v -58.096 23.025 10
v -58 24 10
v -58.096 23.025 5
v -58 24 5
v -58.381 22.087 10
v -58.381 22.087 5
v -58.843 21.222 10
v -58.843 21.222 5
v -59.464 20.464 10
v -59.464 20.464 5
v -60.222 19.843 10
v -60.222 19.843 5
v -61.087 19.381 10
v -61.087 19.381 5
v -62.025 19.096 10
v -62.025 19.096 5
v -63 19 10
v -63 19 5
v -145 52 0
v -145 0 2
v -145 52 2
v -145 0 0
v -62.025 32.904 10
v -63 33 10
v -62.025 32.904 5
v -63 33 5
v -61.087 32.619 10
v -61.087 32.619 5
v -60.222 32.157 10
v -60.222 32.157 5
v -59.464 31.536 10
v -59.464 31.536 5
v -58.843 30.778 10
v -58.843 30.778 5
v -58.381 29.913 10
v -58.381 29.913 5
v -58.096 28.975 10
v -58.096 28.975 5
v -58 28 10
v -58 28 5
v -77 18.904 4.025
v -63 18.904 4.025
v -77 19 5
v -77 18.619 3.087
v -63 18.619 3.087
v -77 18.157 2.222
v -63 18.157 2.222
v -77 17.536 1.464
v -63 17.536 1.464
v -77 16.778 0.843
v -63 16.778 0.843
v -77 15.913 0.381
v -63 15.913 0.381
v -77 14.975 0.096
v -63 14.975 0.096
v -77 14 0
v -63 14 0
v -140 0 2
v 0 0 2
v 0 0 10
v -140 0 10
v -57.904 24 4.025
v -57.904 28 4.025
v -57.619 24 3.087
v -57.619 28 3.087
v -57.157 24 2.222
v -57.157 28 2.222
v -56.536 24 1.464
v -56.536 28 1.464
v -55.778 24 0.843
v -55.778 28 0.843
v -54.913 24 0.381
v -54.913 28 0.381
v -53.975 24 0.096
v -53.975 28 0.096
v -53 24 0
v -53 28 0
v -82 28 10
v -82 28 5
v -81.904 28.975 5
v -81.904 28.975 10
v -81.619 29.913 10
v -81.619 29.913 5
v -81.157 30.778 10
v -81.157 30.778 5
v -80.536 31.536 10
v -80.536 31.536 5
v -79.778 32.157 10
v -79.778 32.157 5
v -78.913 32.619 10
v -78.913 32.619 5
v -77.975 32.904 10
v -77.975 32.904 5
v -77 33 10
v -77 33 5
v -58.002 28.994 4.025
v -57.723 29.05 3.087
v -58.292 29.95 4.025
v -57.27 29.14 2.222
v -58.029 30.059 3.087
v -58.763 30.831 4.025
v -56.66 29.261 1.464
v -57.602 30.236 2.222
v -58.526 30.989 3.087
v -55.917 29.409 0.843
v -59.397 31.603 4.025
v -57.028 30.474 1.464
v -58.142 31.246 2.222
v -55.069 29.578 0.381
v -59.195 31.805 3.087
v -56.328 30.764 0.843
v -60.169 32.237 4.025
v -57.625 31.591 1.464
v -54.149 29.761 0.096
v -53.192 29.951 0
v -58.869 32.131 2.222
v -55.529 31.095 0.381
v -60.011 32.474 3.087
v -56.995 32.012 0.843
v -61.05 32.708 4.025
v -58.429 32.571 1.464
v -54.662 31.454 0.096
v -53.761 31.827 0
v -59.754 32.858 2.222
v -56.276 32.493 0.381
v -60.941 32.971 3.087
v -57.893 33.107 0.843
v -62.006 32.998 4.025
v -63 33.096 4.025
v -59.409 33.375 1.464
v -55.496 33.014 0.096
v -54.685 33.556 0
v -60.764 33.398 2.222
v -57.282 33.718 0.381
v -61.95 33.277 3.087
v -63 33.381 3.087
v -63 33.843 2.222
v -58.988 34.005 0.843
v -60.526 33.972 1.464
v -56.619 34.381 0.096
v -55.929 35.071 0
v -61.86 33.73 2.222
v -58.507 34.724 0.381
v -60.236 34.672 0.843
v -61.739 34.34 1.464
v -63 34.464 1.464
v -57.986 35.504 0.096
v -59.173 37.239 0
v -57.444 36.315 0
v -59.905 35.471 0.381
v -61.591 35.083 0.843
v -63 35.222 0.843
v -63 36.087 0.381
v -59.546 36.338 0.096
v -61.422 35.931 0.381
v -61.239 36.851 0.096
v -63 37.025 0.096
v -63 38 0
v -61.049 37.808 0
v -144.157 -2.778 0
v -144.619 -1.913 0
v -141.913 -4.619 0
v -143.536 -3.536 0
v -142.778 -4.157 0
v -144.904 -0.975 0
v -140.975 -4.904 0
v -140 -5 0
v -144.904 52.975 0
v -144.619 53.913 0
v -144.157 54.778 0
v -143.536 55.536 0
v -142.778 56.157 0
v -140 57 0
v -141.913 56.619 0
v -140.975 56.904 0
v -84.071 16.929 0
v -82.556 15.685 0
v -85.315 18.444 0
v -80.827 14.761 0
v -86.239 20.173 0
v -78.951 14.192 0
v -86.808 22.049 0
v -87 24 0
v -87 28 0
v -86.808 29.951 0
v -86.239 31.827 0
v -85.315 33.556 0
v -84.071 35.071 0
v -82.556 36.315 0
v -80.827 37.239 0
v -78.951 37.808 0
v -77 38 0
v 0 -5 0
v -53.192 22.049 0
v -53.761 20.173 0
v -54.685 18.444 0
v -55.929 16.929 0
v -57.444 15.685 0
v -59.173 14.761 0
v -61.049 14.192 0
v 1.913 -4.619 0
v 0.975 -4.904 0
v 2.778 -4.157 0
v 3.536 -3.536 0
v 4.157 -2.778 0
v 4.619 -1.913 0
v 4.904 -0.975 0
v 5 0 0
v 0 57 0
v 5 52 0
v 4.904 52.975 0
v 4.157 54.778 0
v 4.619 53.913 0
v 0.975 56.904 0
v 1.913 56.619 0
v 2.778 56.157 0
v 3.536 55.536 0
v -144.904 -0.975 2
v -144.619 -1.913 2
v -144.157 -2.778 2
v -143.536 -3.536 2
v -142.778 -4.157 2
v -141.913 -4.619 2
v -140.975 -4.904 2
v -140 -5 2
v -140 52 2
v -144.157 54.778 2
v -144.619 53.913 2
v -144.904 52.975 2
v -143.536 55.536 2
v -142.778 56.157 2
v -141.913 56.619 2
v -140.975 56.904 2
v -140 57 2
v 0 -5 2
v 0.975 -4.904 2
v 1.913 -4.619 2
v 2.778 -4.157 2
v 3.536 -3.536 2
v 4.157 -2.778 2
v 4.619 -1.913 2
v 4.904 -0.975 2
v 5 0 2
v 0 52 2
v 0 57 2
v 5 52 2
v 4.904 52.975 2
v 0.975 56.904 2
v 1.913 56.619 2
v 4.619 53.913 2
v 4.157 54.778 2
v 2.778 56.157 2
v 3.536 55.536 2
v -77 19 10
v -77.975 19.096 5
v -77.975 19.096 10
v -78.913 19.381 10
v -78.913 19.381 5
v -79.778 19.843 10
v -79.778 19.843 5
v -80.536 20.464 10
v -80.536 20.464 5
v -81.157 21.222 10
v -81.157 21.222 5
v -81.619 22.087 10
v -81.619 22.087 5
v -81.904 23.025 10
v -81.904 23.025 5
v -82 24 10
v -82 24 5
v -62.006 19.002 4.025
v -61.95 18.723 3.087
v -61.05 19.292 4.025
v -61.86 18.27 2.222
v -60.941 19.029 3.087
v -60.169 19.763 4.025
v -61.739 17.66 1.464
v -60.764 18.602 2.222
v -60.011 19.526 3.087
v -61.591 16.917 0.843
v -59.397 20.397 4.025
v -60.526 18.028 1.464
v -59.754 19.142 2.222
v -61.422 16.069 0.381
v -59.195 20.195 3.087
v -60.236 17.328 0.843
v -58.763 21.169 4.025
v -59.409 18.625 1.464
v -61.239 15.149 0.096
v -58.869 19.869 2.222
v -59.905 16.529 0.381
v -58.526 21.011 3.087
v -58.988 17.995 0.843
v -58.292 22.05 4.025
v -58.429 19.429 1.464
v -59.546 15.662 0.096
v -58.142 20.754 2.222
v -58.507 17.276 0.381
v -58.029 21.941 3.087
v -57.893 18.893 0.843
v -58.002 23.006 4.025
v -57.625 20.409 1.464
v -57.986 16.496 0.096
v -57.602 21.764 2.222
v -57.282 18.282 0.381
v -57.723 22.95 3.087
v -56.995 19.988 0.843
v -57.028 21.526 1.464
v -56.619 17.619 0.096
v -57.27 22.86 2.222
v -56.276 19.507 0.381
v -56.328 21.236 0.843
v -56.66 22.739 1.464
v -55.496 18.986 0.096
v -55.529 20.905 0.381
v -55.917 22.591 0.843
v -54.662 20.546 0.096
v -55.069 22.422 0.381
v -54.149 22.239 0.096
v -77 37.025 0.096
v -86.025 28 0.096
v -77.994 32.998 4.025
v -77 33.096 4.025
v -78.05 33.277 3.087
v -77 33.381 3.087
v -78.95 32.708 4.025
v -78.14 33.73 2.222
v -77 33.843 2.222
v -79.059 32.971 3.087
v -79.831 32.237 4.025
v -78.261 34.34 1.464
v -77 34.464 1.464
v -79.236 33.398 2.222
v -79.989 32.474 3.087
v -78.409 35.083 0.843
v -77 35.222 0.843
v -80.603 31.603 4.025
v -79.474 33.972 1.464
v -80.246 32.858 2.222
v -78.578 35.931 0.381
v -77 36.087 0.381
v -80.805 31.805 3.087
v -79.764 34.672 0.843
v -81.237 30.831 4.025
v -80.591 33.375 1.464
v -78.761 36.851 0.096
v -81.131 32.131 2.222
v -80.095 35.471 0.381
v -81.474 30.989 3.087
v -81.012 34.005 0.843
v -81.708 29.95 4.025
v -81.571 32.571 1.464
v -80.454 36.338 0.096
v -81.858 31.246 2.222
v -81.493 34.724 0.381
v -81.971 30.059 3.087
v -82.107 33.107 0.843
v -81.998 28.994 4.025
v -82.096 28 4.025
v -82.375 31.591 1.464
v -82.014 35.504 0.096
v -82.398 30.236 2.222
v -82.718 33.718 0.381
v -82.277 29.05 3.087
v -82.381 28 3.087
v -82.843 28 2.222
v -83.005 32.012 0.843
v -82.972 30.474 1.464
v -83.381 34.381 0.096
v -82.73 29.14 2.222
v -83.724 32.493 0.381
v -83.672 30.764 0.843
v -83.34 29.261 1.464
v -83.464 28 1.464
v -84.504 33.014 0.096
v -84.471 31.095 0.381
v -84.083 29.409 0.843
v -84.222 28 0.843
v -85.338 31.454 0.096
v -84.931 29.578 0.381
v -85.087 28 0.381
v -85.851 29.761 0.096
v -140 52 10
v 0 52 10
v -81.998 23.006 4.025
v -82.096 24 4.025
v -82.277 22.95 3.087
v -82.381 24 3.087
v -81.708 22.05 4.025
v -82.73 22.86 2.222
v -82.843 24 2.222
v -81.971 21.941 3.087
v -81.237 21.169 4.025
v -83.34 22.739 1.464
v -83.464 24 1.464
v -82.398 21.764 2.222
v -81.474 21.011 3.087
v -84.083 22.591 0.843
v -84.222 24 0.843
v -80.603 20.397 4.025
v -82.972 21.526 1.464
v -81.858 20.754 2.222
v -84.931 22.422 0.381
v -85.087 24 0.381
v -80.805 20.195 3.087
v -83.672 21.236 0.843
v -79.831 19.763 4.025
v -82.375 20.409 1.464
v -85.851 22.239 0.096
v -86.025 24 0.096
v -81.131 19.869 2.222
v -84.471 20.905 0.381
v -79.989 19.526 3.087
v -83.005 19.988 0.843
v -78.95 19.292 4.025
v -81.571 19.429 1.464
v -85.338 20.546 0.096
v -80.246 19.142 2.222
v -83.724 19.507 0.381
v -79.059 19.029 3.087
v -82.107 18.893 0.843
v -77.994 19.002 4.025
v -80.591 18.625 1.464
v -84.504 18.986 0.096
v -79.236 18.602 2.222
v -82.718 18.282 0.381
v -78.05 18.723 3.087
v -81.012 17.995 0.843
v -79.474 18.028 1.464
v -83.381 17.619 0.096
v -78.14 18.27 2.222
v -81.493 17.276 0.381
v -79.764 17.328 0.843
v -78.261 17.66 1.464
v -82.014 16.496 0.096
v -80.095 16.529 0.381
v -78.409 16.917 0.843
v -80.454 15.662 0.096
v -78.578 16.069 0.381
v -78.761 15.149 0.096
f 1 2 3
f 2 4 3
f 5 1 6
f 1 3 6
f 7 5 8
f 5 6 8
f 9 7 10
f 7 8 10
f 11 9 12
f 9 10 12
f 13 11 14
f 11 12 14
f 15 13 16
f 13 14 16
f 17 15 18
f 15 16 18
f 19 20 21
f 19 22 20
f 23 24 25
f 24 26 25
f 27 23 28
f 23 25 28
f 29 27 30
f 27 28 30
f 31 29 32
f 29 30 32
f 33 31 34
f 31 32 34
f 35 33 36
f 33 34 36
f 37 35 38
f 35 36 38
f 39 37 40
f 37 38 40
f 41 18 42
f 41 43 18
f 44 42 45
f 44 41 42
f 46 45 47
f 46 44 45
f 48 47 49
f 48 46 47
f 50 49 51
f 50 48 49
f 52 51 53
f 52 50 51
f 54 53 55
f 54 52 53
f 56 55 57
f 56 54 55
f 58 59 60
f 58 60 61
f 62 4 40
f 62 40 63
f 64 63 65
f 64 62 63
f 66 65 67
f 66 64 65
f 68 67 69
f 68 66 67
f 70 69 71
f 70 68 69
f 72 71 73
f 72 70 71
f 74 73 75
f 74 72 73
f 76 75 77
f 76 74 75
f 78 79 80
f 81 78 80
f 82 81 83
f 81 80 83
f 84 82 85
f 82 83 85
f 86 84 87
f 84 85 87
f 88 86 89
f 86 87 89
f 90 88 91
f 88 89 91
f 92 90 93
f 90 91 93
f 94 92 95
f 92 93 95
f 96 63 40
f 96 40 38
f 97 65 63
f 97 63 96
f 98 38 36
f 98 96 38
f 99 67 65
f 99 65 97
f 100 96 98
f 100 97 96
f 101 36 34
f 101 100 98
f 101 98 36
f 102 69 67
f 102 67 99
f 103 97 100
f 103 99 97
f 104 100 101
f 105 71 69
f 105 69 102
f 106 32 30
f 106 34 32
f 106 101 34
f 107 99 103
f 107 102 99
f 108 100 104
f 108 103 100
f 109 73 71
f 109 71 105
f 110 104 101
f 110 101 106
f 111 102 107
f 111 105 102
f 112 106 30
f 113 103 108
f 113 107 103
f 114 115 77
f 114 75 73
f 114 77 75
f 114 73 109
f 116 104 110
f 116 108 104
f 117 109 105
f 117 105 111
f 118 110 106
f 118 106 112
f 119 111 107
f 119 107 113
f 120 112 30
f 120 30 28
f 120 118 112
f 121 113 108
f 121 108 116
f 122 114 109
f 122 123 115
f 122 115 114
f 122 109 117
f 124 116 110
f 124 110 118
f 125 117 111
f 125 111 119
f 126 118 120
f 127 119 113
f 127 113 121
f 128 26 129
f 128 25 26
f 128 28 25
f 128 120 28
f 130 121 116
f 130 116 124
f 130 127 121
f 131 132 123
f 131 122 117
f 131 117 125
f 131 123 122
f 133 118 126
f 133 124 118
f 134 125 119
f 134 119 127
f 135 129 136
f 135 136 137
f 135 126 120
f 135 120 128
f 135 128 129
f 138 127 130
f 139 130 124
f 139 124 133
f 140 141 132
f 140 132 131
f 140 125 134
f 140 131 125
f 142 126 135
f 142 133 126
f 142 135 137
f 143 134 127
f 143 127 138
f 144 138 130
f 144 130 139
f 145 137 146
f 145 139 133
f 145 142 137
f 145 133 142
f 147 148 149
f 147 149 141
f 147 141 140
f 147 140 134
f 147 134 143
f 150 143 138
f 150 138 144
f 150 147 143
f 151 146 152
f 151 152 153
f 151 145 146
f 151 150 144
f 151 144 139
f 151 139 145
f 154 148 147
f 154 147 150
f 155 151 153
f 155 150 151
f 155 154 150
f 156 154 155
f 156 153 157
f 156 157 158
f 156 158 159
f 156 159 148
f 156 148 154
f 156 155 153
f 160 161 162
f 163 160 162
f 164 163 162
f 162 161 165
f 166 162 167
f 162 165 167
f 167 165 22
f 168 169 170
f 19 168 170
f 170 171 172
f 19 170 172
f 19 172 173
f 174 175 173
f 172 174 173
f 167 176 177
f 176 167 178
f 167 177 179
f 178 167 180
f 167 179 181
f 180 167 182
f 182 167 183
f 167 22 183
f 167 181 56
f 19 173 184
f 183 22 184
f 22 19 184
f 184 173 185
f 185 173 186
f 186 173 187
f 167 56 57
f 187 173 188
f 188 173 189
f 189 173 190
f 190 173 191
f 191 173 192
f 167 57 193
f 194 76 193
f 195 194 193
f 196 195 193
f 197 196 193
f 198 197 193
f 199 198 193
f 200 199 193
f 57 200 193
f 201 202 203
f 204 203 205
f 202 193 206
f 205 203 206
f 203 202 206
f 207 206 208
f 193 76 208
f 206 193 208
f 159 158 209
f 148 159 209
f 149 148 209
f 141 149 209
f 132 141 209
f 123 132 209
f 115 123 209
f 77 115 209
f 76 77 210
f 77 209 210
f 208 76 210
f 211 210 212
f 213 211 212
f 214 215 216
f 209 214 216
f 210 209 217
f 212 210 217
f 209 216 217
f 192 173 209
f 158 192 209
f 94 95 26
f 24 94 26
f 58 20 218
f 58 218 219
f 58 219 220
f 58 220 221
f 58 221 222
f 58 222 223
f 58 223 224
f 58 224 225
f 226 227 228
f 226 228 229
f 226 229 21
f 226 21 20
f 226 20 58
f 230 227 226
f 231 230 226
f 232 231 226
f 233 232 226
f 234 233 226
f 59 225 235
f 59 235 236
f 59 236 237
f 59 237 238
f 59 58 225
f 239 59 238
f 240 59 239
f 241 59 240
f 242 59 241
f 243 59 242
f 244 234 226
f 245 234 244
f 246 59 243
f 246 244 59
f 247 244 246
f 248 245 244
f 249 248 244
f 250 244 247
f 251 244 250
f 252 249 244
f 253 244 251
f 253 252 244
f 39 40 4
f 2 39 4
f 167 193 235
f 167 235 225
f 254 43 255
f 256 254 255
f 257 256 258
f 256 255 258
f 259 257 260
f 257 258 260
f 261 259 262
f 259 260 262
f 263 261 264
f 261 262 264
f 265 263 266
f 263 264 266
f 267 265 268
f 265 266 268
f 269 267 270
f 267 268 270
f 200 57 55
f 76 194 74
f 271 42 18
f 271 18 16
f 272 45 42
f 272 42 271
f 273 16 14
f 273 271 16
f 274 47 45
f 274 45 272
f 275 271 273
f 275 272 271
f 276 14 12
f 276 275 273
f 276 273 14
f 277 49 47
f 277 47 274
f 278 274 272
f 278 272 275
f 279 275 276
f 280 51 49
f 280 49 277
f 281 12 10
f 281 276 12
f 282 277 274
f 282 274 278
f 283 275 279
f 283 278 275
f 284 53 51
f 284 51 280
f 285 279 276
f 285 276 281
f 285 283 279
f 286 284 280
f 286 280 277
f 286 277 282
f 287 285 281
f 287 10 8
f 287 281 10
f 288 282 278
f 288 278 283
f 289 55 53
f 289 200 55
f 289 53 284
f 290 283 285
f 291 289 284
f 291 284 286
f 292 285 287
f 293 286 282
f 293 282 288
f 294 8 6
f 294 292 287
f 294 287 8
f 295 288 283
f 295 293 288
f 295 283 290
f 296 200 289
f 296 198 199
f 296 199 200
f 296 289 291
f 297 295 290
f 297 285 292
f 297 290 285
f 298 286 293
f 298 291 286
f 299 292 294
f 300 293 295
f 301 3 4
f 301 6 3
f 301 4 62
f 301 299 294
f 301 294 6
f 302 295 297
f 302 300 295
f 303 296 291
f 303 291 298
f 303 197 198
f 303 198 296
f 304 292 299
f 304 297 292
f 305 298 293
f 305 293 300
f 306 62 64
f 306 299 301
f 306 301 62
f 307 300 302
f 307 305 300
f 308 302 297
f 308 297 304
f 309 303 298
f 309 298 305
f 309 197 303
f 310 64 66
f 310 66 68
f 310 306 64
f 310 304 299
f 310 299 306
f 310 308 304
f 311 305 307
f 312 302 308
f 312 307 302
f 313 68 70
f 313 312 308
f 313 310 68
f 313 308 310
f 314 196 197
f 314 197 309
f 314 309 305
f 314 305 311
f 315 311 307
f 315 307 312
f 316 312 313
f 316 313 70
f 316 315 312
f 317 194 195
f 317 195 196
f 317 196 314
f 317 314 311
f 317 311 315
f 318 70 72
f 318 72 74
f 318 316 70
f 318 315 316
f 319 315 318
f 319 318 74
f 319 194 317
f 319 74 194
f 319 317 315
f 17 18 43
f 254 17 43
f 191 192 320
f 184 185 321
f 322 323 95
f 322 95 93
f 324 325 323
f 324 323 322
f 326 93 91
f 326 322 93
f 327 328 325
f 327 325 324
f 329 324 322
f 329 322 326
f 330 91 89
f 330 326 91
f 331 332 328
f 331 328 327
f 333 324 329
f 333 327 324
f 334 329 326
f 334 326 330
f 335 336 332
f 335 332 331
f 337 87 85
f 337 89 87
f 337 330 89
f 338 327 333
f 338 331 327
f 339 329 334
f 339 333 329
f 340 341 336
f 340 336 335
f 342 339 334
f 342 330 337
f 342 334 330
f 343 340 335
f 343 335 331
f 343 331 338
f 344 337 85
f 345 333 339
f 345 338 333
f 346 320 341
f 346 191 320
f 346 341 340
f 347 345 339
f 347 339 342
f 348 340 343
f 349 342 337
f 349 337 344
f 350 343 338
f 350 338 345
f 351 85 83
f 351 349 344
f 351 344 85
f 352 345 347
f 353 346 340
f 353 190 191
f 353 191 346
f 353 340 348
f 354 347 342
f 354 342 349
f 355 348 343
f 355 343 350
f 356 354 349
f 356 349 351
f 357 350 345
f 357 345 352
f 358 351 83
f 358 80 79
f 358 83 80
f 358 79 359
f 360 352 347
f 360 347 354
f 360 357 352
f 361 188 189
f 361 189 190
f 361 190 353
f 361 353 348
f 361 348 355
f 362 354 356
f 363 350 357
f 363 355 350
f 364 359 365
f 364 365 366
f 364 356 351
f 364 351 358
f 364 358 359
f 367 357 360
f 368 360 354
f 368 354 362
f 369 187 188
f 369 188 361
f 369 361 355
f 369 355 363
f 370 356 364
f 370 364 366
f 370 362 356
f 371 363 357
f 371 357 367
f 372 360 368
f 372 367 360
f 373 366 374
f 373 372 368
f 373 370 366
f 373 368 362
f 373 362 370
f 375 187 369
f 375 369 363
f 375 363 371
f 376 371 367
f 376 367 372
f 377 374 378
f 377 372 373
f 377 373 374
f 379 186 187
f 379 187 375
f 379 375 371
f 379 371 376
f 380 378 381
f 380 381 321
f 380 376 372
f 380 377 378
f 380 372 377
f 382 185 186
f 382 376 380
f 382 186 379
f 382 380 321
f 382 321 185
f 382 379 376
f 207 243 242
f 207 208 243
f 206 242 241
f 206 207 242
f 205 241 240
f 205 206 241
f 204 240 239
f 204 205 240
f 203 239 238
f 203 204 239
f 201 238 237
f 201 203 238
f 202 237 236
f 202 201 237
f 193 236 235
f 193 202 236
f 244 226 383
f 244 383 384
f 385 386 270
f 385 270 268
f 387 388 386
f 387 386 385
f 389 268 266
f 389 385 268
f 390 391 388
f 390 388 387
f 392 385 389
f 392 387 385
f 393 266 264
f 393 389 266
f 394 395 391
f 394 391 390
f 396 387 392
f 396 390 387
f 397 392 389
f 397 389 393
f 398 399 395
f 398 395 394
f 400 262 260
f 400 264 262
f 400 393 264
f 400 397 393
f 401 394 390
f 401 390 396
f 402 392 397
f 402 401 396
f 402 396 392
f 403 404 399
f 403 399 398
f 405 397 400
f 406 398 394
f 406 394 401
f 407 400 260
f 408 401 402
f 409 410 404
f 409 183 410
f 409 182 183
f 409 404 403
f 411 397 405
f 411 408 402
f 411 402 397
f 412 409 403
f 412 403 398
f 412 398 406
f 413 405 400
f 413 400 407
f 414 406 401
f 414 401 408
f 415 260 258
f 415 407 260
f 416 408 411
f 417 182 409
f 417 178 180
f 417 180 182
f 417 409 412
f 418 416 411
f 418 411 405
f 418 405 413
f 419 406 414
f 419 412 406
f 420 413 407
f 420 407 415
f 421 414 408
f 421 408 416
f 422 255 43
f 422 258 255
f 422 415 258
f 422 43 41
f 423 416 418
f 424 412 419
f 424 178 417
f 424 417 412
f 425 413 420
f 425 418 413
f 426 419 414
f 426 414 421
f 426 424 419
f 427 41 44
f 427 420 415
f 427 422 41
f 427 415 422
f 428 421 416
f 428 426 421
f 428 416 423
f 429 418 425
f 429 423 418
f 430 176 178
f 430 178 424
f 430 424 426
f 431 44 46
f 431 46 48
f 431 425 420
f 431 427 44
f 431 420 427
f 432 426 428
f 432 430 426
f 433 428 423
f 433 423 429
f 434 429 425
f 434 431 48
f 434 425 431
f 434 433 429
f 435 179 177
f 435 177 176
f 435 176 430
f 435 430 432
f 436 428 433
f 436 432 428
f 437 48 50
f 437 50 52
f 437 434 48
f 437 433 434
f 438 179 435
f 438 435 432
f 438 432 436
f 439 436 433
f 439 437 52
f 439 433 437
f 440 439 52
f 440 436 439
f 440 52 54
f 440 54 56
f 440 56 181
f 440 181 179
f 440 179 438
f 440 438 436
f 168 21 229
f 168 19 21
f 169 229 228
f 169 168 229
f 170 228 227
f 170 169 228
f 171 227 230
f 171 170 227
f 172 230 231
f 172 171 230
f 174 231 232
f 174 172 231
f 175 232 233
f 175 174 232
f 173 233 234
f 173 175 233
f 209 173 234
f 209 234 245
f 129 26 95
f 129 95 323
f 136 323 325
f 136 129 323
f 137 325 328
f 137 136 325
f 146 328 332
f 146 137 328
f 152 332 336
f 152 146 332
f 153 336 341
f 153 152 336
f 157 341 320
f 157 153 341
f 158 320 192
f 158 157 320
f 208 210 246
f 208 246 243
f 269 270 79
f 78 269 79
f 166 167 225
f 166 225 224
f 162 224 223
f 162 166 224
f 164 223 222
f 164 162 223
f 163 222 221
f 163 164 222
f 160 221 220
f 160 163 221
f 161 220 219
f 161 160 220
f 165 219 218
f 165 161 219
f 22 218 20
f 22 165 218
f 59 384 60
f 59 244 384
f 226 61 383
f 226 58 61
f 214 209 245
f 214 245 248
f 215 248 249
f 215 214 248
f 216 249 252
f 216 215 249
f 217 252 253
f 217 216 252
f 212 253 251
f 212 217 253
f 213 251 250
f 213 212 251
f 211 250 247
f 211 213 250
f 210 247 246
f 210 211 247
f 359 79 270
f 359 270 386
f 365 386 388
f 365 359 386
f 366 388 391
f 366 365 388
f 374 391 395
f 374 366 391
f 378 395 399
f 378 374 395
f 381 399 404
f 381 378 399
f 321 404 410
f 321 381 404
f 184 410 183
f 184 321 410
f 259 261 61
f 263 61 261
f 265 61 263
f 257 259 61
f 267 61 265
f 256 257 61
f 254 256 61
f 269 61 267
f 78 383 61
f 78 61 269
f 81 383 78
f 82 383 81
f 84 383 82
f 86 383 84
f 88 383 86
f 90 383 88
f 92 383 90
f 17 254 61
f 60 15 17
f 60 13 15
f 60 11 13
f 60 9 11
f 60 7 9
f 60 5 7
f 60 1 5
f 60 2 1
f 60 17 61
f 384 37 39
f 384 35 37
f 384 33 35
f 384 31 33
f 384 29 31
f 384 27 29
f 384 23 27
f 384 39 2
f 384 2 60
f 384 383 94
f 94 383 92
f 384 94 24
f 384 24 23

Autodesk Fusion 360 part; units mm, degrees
sketch "Sketch1" plane through (0, 0, 0) normal (0, 0, 1) x (1, 0, 0)
  line L0 (0, 0) -> (-140, 0)
  line L1 (-140, 0) -> (-140, 52)
  line L2 (-140, 52) -> (0, 52)
  line L3 (0, 52) -> (0, 0)
  line L4 (0, -5) -> (-140, -5)
  line L5 (-145, 0) -> (-145, 52)
  line L6 (-140, 57) -> (0, 57)
  line L7 (5, 52) -> (5, 0)
  line L8 (-63, 19) -> (-77, 19)
  line L9 (-58, 28) -> (-58, 24)
  arc A0 (-77, 33) -> (-82, 28) centre (-77, 28) ccw
  arc A1 (-82, 24) -> (-77, 19) centre (-77, 24) ccw
  arc A2 (-63, 19) -> (-58, 24) centre (-63, 24) ccw
  line L10 (-82, 24) -> (-82, 28)
  line L11 (-77, 33) -> (-63, 33)
  arc A3 (-58, 28) -> (-63, 33) centre (-63, 28) ccw
  arc A4 (0, -5) -> (5, 0) centre (0, 0) ccw
  arc A5 (5, 52) -> (0, 57) centre (0, 52) ccw
  arc A6 (-140, 57) -> (-145, 52) centre (-140, 52) ccw
  arc A7 (-145, 0) -> (-140, -5) centre (-140, 0) ccw
  point P0 (-82, 19)
  point P1 (-82, 33)
  point P2 (-58, 33)
  dimension "d1" = 140
  dimension "d2" = 52
  dimension "d4" = 24
  dimension "d5" = 14
  dimension "d7" = 5
  dimension "d8" = 5
  dimension "d9" = 19
  dimension "d10" = 58
  dimension "d11" = 5
extrude "Extrude1" add sketch "Sketch1" along normal blind 10 contours L0 L1 L2 L3
fillet "Fillet1" radius 5 8 edges at (-82, 26, 0) (-80.5355, 31.5355, 0) (-70, 33, 0) (-59.4645, 31.5355, 0) (-58, 26, 0) (-59.4645, 20.4645, 0) (-70, 19, 0) (-80.5355, 20.4645, 0)
extrude "Extrude2" add sketch "Sketch1" along normal blind 2 contours L4 L5 L6 L7 A4 A5 A6 A7
properties part number "Back Plate"
